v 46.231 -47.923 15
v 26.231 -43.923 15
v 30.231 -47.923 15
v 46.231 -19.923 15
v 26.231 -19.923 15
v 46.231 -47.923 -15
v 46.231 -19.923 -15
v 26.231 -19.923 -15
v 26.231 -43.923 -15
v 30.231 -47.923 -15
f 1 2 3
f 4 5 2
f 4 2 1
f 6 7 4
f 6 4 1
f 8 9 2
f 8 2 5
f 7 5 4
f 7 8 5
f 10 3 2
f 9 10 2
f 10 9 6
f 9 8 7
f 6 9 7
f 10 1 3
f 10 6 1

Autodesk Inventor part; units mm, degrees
ref_plane "YZ Plane" through (0, 0, 0) normal (1, 0, 0) x (0, 1, 0)
ref_plane "XZ Plane" through (0, 0, 0) normal (0, 1, 0) x (-1, 0, 0)
ref_plane "XY Plane" through (0, 0, 0) normal (0, 0, 1) x (1, 0, 0)
sketch "Skizze1" plane through (0, 0, 0) normal (0, 0, 1) x (1, 0, 0)
  line L0 (26.2311, -43.9228) -> (26.2311, -19.9228)
  line L1 (26.2311, -19.9228) -> (46.2311, -19.9228)
  line L2 (46.2311, -19.9228) -> (46.2311, -47.9228)
  line L3 (46.2311, -47.9228) -> (30.2311, -47.9228)
  line L4 (30.2311, -47.9228) -> (26.2311, -43.9228)
  point P0 (0, 0)
  dimension "d0" = 45
  dimension "d1" = 4
  dimension "d2" = 20
  dimension "d4" = 28
extrude "Extrusion1" add sketch "Skizze1" along normal mid plane 30
properties part number "_WT_Aufnahme_Antriebseinheit2"
